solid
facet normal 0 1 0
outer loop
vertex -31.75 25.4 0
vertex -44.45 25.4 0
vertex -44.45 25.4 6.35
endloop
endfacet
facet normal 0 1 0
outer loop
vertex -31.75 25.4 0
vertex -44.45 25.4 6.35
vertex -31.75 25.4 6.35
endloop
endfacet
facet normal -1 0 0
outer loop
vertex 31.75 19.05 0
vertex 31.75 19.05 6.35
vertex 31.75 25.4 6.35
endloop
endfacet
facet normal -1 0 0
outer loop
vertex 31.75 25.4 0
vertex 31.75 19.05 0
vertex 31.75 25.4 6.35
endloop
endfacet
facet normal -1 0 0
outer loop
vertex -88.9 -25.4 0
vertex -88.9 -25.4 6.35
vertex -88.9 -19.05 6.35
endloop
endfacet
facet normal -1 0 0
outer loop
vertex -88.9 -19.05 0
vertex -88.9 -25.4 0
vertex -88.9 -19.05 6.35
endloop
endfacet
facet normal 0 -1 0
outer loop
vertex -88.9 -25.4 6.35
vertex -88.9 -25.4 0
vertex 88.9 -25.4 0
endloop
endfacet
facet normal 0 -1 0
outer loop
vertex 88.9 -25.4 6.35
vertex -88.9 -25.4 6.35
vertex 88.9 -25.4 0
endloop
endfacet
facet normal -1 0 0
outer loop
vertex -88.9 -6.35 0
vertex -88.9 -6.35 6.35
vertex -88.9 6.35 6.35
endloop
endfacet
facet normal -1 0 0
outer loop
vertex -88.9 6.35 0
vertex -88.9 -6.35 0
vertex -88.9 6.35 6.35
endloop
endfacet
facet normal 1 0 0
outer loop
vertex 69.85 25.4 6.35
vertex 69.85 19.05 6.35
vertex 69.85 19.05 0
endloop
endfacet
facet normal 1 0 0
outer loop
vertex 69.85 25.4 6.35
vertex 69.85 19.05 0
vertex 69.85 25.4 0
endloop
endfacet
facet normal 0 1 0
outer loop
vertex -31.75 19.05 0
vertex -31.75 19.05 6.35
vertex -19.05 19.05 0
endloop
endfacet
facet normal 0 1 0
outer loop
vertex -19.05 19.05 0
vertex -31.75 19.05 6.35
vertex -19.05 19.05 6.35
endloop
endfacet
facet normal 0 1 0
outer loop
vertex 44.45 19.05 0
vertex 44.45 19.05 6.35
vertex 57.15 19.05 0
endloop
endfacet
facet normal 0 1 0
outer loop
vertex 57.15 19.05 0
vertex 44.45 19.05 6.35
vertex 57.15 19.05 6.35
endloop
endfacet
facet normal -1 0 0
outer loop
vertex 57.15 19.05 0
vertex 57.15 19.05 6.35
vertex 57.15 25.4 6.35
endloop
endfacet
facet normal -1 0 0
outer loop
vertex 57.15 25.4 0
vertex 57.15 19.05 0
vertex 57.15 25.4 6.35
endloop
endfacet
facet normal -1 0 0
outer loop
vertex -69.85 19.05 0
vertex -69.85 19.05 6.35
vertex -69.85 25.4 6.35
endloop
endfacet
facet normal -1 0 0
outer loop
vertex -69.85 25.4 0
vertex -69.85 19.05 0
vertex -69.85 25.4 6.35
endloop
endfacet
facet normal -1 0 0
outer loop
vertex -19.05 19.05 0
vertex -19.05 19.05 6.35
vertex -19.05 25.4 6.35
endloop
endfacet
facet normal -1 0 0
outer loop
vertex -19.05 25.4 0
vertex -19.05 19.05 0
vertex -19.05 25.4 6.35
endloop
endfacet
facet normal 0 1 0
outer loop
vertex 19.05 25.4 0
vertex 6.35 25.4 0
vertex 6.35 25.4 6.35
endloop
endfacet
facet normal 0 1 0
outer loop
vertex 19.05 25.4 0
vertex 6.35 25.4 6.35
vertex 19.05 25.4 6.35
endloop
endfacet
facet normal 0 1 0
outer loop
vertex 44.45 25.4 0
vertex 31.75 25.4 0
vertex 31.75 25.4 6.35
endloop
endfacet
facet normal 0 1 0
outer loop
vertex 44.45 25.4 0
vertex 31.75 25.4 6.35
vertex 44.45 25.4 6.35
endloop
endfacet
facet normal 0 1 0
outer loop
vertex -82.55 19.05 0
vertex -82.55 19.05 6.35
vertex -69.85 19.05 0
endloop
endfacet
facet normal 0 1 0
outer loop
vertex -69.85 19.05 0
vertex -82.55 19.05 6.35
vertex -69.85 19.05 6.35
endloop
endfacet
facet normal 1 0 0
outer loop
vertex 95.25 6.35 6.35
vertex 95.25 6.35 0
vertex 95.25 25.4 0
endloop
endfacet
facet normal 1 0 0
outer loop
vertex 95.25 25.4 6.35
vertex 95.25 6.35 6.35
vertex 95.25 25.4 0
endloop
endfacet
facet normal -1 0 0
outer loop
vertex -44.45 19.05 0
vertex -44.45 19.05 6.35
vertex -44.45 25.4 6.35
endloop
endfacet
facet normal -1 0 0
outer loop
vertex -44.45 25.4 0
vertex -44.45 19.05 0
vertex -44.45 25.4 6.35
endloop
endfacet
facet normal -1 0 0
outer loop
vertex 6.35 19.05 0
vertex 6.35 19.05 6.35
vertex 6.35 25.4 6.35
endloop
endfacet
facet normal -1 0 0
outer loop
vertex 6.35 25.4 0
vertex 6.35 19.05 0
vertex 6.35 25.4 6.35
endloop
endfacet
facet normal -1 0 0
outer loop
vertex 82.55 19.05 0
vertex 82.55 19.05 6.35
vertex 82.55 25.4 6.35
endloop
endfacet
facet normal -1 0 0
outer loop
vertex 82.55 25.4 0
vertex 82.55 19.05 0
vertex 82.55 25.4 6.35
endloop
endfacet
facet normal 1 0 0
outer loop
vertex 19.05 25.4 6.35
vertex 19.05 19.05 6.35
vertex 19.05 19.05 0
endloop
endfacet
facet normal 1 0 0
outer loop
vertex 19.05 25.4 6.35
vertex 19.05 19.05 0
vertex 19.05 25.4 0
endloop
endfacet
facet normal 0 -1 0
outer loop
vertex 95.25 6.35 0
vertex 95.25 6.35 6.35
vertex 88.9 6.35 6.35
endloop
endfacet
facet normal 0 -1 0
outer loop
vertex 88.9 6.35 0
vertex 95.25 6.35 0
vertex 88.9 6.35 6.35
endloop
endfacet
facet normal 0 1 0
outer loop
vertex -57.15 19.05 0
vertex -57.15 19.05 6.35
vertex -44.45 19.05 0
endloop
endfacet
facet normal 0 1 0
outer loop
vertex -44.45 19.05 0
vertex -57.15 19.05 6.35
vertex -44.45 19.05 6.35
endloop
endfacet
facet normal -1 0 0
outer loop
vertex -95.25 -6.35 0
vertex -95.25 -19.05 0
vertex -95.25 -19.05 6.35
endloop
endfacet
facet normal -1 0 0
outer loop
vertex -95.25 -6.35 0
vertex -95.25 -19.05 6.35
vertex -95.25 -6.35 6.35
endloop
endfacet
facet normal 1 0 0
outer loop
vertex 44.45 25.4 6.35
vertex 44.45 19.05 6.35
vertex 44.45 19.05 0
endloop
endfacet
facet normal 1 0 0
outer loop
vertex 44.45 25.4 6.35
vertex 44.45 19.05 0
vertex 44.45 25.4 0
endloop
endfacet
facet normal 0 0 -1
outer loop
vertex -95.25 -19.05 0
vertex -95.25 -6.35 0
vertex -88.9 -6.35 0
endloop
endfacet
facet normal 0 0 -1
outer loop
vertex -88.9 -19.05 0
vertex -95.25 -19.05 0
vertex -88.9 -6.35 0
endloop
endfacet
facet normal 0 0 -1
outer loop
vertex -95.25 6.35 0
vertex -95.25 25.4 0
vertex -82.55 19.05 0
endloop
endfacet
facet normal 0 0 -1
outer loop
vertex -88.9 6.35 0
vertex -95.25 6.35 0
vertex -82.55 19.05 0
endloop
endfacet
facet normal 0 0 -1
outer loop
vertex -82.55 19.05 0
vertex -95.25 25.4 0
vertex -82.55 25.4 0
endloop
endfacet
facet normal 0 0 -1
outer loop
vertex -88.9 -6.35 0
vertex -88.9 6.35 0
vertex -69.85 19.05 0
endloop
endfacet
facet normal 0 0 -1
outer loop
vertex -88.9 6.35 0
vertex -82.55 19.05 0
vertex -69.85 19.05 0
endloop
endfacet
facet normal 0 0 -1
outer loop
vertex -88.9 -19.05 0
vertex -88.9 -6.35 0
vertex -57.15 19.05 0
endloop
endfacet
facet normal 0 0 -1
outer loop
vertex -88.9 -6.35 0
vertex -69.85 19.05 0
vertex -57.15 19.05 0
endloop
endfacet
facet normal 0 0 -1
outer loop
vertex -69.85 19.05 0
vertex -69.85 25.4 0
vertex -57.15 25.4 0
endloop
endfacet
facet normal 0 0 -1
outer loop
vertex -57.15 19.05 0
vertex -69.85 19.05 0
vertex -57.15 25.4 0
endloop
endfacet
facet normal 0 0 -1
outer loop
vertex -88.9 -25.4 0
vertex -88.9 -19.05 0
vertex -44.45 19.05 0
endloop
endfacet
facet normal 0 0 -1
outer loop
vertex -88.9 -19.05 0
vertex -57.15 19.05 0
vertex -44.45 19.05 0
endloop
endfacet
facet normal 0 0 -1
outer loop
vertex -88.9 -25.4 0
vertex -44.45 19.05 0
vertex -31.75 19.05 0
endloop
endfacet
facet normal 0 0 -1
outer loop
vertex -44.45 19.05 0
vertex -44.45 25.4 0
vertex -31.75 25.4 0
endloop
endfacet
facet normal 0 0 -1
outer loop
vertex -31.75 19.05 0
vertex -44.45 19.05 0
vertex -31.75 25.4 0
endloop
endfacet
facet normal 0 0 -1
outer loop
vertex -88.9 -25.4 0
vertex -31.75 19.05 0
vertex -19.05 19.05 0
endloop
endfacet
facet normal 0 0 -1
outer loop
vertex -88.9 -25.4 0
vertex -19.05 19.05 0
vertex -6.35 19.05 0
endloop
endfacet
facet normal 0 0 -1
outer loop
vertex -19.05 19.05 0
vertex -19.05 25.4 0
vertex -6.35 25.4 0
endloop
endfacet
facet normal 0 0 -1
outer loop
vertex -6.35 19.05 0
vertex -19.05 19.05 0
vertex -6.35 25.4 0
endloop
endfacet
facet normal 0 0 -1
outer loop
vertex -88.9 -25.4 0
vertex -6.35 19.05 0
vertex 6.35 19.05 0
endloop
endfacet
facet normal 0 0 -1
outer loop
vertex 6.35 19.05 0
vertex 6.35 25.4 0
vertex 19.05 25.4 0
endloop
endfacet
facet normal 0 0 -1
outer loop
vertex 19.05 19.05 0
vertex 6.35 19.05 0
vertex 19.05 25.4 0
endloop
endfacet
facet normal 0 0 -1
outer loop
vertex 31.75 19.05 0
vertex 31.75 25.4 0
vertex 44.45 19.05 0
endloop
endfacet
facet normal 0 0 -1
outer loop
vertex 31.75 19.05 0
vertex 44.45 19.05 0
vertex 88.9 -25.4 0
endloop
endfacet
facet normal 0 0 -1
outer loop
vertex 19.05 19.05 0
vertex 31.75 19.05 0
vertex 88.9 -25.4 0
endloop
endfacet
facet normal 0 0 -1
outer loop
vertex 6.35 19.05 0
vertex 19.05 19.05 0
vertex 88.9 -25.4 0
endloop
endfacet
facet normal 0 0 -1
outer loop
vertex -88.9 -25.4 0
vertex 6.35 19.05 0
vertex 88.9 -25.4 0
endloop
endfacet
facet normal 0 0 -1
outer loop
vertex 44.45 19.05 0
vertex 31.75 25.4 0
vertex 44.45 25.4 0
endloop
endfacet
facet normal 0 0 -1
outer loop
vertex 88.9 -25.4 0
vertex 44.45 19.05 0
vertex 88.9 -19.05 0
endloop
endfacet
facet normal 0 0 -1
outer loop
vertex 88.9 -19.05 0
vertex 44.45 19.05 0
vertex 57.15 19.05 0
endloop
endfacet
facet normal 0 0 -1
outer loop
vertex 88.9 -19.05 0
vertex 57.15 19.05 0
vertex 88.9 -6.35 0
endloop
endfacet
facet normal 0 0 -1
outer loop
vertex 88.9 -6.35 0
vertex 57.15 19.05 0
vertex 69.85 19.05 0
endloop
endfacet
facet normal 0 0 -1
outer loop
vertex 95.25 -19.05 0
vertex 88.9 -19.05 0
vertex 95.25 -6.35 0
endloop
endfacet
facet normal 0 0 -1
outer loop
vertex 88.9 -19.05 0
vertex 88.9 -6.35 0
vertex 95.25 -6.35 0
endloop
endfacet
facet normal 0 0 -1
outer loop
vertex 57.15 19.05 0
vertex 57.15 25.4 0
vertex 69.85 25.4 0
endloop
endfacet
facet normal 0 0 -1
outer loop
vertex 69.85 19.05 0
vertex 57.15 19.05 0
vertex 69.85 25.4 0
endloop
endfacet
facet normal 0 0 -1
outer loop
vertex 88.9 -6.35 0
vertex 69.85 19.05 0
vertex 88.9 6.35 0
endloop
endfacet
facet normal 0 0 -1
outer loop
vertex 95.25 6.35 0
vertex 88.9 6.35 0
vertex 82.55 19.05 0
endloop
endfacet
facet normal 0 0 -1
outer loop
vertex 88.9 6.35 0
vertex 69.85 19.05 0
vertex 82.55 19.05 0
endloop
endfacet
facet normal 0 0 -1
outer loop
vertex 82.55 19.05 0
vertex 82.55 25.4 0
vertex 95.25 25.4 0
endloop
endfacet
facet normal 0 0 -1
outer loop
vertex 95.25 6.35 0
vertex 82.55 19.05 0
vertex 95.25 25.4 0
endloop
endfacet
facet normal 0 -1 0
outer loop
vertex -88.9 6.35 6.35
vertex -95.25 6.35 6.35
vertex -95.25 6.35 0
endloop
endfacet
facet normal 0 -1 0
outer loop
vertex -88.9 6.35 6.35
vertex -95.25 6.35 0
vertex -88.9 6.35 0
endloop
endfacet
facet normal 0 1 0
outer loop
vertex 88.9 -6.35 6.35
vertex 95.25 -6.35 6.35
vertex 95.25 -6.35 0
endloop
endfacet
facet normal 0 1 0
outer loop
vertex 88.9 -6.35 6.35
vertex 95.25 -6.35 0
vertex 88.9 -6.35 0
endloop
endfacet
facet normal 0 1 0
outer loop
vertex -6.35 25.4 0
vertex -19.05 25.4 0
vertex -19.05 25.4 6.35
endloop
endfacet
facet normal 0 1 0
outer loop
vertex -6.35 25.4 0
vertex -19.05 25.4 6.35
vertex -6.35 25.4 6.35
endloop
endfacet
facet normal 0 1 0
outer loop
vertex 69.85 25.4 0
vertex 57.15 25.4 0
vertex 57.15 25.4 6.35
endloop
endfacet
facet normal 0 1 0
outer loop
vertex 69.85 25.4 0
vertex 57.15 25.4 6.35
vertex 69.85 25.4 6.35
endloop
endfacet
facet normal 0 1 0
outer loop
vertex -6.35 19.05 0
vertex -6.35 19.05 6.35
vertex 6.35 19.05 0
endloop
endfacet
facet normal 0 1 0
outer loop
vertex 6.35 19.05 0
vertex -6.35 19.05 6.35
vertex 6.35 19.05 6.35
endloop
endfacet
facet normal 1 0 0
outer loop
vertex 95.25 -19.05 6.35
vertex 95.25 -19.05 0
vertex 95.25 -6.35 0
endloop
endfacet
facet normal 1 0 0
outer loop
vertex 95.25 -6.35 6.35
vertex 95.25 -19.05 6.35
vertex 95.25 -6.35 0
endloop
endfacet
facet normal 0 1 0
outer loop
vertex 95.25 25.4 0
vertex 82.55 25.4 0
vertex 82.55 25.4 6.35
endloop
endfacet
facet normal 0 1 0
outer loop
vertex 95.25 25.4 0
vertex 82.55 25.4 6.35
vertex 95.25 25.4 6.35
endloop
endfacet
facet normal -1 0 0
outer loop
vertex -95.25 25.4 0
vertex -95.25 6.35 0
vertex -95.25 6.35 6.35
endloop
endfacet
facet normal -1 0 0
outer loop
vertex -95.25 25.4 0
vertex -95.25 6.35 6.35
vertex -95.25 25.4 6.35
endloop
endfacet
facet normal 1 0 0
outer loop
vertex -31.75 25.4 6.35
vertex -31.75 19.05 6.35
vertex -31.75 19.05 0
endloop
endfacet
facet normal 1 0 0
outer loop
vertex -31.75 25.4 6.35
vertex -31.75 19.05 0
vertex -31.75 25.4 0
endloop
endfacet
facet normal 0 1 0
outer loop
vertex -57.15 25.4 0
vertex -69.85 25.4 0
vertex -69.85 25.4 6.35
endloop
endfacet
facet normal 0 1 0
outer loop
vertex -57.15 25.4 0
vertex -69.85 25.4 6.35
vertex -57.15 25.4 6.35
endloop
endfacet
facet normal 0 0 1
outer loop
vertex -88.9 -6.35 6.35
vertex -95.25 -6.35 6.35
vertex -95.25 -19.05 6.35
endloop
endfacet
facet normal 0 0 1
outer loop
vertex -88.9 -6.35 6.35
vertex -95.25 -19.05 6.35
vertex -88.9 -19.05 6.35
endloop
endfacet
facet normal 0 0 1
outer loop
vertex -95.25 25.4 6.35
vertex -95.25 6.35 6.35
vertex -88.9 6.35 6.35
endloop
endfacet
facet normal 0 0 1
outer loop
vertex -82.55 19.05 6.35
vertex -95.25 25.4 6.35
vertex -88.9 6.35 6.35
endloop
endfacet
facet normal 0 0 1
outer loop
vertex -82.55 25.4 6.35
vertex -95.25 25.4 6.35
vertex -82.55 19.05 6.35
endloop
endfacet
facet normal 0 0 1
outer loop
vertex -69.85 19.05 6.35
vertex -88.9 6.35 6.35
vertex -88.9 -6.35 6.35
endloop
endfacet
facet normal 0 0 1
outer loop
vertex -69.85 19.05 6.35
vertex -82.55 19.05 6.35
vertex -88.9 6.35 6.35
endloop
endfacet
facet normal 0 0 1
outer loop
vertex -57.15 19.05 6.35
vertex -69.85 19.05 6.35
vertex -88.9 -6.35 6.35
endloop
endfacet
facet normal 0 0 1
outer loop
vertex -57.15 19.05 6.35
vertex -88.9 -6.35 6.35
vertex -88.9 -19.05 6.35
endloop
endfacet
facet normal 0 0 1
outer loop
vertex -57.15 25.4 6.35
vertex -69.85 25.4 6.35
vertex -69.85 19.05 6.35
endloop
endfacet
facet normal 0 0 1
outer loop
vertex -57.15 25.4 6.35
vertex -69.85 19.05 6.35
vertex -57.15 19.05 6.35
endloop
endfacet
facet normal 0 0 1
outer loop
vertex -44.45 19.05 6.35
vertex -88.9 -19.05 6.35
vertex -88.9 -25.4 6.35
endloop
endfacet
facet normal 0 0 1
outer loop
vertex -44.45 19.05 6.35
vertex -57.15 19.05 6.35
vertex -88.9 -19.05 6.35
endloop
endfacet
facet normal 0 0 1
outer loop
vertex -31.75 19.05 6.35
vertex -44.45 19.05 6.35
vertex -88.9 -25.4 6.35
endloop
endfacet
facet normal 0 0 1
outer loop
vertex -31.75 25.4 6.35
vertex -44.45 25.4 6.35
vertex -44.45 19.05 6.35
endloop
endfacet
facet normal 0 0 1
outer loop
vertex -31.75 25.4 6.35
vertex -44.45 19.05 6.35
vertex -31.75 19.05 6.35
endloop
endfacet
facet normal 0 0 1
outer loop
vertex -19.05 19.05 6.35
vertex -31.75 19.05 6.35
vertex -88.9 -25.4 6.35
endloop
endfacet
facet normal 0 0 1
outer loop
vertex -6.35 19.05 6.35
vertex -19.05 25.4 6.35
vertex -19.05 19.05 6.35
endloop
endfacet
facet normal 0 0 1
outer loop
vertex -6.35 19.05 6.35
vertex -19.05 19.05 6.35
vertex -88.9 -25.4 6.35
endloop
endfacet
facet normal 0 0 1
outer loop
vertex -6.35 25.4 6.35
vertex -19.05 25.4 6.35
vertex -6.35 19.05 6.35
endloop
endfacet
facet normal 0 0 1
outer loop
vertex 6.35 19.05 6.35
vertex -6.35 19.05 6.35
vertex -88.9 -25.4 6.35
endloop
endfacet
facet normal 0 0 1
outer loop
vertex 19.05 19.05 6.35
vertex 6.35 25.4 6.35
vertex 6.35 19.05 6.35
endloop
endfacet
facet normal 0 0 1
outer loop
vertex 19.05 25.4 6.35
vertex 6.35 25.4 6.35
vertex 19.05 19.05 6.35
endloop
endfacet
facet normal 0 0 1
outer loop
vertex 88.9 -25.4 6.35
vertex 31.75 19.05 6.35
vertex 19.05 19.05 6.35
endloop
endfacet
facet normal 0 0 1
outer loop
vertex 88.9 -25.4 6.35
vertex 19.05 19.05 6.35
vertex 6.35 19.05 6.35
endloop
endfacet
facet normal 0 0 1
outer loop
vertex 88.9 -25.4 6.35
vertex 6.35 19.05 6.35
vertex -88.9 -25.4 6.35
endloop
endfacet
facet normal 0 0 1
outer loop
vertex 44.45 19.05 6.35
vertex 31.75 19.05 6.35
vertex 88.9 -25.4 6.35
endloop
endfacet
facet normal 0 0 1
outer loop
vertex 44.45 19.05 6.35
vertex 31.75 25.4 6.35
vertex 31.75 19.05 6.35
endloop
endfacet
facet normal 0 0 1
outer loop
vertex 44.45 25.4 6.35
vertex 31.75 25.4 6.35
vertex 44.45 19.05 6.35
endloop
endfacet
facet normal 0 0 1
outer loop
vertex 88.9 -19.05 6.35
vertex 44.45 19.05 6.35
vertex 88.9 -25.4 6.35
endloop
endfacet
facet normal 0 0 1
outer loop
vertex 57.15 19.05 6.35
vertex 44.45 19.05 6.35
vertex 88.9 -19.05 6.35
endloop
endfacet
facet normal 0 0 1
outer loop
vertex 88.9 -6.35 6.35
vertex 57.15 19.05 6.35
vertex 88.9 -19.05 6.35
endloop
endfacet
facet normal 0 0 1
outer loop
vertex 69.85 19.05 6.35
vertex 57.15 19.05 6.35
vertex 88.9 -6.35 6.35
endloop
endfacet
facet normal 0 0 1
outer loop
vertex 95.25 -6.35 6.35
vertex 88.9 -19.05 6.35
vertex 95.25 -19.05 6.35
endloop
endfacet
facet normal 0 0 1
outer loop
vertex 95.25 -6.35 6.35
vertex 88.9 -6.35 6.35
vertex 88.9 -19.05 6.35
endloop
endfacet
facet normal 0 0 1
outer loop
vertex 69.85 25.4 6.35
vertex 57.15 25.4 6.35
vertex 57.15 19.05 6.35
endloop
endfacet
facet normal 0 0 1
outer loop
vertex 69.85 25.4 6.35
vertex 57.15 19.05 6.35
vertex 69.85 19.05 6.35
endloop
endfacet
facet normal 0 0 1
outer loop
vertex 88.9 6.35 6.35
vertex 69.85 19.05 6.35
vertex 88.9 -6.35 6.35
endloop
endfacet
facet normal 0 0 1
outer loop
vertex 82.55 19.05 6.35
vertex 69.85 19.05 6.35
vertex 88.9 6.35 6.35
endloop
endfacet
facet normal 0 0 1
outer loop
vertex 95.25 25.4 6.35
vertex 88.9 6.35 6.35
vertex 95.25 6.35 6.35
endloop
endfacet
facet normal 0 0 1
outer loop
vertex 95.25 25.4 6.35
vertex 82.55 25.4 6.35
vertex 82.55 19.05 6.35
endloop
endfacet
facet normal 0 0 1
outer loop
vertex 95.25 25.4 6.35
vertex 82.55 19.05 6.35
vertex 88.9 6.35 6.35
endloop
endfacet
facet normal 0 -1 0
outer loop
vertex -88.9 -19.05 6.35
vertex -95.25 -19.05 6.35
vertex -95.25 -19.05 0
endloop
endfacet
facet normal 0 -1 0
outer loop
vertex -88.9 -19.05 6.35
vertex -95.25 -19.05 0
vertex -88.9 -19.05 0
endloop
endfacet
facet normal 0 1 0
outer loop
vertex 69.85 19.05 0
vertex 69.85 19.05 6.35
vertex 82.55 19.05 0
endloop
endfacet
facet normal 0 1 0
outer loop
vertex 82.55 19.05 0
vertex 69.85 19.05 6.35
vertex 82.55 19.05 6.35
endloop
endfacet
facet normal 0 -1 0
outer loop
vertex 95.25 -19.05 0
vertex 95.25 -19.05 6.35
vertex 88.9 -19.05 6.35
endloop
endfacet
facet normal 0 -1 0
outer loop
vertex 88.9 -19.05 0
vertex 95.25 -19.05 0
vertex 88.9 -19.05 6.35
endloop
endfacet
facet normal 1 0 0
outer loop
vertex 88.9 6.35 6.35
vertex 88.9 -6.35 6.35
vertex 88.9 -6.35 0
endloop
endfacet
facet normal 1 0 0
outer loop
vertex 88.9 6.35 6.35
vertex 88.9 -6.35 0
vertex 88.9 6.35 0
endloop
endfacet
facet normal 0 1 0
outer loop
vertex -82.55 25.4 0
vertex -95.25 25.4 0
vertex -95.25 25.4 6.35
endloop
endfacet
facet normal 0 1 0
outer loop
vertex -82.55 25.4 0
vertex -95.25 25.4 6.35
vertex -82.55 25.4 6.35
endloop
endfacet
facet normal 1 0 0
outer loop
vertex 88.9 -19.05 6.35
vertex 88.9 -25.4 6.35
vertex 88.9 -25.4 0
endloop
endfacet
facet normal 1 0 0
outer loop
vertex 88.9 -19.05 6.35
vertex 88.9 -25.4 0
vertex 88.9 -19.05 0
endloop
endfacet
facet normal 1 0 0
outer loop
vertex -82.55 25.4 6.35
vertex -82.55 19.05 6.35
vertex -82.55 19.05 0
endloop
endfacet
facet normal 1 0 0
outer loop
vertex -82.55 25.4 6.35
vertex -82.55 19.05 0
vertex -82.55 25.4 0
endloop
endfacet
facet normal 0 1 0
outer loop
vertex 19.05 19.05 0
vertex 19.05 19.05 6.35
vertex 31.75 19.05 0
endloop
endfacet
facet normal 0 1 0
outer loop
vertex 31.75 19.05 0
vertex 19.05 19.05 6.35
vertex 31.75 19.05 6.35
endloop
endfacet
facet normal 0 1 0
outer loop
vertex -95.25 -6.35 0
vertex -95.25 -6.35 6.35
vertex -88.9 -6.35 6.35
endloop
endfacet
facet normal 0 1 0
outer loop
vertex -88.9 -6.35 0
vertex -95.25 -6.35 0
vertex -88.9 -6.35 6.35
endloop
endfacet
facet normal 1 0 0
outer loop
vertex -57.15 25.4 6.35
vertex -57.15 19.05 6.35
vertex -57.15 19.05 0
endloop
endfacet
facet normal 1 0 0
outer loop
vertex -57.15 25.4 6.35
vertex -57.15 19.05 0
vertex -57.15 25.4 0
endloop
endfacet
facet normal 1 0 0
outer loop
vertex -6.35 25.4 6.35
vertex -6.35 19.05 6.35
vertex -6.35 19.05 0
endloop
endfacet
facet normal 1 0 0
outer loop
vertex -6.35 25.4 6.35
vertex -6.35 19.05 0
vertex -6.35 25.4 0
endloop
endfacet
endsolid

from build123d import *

# Parameters (mm, degrees)
SKETCH1_W           = 190.5
SKETCH1_H           = 50.8
BOSS_EXTRUDE1_DEPTH = 6.35
SKETCH2_W           = 6.35
SKETCH2_H           = 12.7
CUT_EXTRUDE1_DEPTH  = 7.35
SKETCH3_W           = 6.35
SKETCH3_H           = 6.35
CUT_EXTRUDE2_DEPTH  = 7.35
SKETCH4_W           = 12.7
SKETCH4_H           = 6.35
CUT_EXTRUDE3_DEPTH  = 7.35
LPATTERN1_COUNT     = 7
LPATTERN1_PITCH     = 25.4


with BuildPart() as part:
    # Sketch1 → Boss-Extrude1 (new body)
    with BuildSketch(Plane.XY):
        Rectangle(SKETCH1_W, SKETCH1_H)
    extrude(amount=BOSS_EXTRUDE1_DEPTH)

    # Sketch2 → Cut-Extrude1 (cut, through all)
    with BuildSketch(Plane.XY.offset(6.35)):
        with Locations((-92.075, 0)):
            Rectangle(SKETCH2_W, SKETCH2_H)
    cut_extrude1 = extrude(amount=-CUT_EXTRUDE1_DEPTH, mode=Mode.SUBTRACT)

    # Sketch3 → Cut-Extrude2 (cut, through all)
    with BuildSketch(Plane.XY.offset(6.35)):
        with Locations((-92.075, -22.225)):
            Rectangle(SKETCH3_W, SKETCH3_H)
    cut_extrude2 = extrude(amount=-CUT_EXTRUDE2_DEPTH, mode=Mode.SUBTRACT)

    # Mirror1: Cut-Extrude2 across plane
    add(cut_extrude2.mirror(Plane(origin=(0, 0, 0), x_dir=(0, 0, 1), z_dir=(1, 0, 0))), mode=Mode.SUBTRACT)

    # Mirror2: Cut-Extrude1 across plane
    add(cut_extrude1.mirror(Plane(origin=(0, 0, 0), x_dir=(0, 0, 1), z_dir=(1, 0, 0))), mode=Mode.SUBTRACT)

    # Sketch4 → Cut-Extrude3 (cut, through all)
    with BuildSketch(Plane.XY.offset(6.35)):
        with Locations((-76.2, 22.225)):
            Rectangle(SKETCH4_W, SKETCH4_H)
    cut_extrude3 = extrude(amount=-CUT_EXTRUDE3_DEPTH, mode=Mode.SUBTRACT)

    # LPattern1: Cut-Extrude3 ×7
    with Locations(*[(i * LPATTERN1_PITCH, 0, 0) for i in range(1, LPATTERN1_COUNT)]):
        add(cut_extrude3, mode=Mode.SUBTRACT)


solid = part.part
